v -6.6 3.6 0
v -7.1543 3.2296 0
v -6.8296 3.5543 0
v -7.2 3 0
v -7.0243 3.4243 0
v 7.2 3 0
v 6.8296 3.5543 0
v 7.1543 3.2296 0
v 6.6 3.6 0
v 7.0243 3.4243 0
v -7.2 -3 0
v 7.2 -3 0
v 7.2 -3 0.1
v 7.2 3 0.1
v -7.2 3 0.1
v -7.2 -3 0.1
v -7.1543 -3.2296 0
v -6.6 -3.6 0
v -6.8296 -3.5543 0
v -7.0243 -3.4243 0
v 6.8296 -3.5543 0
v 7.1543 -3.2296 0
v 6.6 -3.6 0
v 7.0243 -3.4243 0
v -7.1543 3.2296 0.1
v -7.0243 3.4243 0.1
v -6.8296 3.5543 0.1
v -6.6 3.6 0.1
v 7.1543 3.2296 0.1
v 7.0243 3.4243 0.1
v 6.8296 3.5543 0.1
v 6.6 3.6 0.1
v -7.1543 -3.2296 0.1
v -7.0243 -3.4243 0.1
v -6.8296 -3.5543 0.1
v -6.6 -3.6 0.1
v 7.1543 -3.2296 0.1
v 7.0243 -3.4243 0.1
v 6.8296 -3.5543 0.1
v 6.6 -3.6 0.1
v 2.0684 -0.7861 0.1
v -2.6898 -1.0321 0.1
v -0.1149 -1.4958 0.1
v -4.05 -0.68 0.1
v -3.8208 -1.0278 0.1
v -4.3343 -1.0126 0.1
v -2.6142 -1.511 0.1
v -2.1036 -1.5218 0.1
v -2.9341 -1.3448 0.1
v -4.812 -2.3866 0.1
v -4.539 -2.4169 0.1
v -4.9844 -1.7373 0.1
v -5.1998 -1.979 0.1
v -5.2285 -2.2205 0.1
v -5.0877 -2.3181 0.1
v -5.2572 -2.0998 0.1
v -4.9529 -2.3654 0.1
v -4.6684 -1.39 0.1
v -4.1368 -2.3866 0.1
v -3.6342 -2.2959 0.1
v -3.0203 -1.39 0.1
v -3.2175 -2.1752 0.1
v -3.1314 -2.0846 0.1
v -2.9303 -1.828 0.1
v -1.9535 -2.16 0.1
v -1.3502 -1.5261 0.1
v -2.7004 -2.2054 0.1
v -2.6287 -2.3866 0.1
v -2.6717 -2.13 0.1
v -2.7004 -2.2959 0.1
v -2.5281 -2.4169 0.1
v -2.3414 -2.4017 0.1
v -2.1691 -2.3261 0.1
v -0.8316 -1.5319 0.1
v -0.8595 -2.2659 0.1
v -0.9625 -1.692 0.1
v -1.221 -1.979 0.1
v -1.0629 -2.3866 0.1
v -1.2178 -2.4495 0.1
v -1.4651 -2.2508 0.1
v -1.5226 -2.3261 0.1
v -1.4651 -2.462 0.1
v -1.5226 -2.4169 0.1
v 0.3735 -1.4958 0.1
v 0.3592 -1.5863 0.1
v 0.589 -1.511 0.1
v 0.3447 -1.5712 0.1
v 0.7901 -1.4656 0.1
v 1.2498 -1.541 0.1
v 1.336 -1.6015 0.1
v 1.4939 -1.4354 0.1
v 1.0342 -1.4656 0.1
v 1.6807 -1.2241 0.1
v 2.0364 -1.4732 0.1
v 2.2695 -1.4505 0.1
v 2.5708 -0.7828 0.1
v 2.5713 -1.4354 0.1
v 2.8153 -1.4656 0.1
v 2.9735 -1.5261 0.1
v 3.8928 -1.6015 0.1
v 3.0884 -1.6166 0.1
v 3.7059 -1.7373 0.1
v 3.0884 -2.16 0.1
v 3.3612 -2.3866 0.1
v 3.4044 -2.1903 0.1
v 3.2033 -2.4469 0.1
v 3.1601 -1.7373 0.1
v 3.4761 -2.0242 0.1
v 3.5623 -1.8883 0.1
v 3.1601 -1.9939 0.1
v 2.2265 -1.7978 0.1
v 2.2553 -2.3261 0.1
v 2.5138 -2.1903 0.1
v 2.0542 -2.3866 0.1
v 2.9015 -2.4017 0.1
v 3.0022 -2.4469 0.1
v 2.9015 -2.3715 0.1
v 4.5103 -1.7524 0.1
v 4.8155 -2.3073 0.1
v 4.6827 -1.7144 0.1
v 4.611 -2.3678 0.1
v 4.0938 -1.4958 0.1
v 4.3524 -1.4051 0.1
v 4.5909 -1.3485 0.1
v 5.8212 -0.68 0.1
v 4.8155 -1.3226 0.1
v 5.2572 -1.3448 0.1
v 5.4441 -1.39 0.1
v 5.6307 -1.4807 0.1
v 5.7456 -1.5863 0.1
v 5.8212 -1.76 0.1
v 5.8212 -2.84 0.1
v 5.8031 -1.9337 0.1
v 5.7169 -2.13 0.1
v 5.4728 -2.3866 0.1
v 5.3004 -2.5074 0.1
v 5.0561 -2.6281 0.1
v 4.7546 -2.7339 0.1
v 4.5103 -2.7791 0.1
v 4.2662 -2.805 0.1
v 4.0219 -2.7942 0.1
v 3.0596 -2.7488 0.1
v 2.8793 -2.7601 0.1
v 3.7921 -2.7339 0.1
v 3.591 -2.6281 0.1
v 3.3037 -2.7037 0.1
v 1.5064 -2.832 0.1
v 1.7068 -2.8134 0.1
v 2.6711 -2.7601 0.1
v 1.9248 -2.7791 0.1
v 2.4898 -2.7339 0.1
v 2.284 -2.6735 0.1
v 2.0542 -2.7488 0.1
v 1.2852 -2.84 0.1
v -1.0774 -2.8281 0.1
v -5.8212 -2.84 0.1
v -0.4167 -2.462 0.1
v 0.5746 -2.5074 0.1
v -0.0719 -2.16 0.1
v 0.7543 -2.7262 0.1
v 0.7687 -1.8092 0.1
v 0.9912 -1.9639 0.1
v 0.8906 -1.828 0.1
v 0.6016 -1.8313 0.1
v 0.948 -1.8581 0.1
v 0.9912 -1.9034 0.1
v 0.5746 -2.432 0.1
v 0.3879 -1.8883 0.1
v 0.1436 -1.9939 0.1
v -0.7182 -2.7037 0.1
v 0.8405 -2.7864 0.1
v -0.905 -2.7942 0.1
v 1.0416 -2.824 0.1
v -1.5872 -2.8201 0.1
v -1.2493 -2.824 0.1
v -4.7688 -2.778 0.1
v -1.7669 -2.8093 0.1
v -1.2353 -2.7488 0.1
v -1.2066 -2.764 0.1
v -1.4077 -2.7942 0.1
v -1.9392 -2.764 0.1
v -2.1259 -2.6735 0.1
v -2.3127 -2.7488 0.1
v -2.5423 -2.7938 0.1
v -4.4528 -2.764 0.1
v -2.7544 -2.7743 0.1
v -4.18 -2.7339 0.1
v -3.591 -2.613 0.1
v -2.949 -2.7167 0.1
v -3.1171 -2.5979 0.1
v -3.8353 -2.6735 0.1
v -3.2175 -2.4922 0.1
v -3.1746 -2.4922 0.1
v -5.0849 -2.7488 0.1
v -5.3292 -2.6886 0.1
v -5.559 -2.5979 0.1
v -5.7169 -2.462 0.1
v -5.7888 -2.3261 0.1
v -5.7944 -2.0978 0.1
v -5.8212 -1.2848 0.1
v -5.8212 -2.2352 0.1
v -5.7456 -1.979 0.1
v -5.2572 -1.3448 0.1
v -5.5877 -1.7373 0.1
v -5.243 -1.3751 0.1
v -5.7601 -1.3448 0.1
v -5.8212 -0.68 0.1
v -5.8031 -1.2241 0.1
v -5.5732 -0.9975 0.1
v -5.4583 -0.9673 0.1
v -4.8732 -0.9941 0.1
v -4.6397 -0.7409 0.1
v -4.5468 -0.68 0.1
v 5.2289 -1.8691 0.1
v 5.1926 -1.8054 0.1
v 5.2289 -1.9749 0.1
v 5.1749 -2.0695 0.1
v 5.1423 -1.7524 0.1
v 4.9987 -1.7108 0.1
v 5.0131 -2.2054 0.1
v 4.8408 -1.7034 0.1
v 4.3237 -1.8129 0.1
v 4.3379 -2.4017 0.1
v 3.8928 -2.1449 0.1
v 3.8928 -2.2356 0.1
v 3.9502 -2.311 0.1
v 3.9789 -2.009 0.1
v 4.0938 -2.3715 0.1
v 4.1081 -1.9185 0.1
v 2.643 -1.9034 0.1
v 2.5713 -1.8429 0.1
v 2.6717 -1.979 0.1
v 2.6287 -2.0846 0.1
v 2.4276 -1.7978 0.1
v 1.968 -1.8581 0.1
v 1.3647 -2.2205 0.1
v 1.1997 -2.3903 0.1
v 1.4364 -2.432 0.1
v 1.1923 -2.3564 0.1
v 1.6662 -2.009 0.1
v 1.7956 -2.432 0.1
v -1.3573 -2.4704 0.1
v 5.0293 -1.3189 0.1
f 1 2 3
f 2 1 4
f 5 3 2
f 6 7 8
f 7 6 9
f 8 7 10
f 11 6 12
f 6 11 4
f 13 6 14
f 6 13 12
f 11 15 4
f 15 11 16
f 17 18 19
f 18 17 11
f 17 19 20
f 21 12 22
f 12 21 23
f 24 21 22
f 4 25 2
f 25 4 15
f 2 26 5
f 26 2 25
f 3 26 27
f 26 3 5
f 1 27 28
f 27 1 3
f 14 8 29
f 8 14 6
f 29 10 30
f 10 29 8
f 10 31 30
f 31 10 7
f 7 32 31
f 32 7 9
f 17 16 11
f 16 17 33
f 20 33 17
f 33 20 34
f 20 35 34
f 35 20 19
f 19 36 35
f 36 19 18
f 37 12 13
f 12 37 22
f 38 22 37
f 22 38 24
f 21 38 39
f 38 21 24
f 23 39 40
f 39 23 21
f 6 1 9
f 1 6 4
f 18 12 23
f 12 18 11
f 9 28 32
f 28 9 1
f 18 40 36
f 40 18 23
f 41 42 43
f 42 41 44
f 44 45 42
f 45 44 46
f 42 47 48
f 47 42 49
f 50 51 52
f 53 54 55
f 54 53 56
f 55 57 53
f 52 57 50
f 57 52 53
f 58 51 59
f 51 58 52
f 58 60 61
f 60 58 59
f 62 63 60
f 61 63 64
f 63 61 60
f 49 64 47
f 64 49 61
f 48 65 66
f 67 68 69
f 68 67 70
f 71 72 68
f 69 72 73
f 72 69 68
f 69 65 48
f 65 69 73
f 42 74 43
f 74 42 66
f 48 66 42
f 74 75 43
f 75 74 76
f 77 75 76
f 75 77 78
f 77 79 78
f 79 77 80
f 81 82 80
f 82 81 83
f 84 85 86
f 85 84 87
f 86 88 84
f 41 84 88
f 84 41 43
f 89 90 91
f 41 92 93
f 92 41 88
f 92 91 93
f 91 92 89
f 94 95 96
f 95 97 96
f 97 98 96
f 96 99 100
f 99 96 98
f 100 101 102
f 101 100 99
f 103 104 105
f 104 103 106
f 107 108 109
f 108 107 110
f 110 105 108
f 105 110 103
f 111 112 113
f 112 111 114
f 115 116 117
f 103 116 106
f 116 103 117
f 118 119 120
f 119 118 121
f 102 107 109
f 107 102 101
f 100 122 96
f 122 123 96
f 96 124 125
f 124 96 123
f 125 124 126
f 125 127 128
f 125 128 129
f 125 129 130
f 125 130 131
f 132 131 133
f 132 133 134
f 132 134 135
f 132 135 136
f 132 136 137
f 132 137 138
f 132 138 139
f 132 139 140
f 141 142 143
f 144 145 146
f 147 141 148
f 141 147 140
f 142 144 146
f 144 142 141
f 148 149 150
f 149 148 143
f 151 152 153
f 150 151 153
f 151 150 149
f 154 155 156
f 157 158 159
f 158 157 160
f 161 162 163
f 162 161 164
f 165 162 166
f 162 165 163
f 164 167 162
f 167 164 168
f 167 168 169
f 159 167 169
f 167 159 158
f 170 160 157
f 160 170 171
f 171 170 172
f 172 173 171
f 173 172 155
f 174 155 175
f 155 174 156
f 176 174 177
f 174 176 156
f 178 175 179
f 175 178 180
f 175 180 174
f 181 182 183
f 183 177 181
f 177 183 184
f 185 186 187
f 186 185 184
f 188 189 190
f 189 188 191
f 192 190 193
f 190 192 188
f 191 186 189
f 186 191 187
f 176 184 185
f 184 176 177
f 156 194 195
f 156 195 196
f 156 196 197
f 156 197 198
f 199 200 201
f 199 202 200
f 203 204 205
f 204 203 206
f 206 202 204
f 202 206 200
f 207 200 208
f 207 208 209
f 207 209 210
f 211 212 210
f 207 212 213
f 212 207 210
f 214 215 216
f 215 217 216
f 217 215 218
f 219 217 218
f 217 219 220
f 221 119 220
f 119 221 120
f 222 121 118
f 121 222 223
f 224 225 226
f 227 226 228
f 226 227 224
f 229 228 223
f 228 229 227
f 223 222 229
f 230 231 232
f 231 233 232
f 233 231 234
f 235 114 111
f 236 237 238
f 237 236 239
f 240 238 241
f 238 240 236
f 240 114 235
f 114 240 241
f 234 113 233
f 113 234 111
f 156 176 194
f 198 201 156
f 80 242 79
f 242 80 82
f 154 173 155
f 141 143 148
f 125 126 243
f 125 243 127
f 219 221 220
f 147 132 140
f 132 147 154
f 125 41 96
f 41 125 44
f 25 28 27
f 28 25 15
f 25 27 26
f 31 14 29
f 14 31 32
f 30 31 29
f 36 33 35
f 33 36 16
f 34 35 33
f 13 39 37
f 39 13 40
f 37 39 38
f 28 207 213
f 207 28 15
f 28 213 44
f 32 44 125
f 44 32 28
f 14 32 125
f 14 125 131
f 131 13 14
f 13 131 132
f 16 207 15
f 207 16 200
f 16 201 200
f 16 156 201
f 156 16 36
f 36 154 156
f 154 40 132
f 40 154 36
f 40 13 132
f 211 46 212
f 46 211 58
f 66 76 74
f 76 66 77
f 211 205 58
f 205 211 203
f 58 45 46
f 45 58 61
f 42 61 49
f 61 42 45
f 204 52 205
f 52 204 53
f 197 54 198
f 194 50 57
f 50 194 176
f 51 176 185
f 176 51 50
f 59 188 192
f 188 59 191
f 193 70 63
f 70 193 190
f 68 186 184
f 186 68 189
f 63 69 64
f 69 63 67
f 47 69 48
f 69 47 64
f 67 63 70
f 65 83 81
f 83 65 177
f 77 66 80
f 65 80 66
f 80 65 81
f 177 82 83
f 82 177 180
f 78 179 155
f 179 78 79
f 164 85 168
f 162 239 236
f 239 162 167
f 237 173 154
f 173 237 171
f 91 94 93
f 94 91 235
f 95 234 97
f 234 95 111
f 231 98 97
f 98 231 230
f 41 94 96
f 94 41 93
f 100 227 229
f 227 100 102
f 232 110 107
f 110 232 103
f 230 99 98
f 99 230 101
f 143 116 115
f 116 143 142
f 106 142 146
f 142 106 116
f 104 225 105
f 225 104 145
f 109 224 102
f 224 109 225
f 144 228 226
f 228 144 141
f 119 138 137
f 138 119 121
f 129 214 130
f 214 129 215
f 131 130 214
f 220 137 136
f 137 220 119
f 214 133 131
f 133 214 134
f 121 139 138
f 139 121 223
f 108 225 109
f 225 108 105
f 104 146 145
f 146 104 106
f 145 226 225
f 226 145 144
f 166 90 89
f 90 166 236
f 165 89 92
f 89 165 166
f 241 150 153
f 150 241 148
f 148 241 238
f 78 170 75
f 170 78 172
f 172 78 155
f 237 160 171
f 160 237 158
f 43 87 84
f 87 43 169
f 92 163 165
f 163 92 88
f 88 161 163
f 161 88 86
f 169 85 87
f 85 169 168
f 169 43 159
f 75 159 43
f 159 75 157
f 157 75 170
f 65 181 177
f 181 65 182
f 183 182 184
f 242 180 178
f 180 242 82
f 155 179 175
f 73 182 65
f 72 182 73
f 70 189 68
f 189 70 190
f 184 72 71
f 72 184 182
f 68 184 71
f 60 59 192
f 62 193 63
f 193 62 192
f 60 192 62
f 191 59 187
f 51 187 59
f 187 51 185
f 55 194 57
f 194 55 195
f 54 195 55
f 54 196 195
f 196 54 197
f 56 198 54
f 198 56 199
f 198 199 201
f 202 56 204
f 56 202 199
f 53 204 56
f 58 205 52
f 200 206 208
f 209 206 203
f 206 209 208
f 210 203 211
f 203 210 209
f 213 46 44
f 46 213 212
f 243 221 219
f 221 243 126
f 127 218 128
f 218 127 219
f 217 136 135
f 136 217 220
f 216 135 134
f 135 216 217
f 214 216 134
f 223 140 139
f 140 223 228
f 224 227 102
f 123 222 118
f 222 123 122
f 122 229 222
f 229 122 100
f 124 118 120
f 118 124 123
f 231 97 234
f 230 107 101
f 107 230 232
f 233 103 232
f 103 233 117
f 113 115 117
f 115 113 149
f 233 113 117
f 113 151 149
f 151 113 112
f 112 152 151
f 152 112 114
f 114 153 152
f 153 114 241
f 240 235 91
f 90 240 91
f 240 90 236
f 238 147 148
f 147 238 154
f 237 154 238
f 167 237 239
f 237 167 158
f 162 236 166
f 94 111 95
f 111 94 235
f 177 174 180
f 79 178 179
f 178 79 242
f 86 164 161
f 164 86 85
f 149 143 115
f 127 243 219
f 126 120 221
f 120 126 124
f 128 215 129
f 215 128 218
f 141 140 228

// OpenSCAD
use <../lib.scad>
use <../p/logo-porsche-turbo-text.scad>
use <s/6221655xs01.scad>
use <s/stickerback009x018.scad>
function ldraw_lib__6285381b() = [
// 0 Sticker  0.8 x  1.8 with Black "turbo" on Transparent Background
// 0 Name: 6285381b.dat
// 0 Author: Magnus Forsberg [MagFors]
// 0 !LDRAW_ORG Part UPDATE 2026-05
// 0 !LICENSE Licensed under CC BY 4.0 : see CAreadme.txt
// 
// 0 BFC CERTIFY CCW
  [0,"BFC","CERTIFY"],
  [0,"BFC","CCW"],
// 
// 0 !KEYWORDS 911, Bricklink 75895stk01, Brickowl 178456, Porsche, rear
// 0 !KEYWORDS Rebrickable 65827, set 75895
// 
// 0 !HISTORY 2022-07-18 [PTadmin] Official Update 2022-04
// 0 !HISTORY 2024-11-03 [MagFors] used logo primitives
// 0 !HISTORY 2026-04-17 [Sirio] Introduced common subpart for top face
// 0 !HISTORY 2026-05-31 [OrionP] Official Update 2026-05
// 
// 0 // Stickerback
// 1 16 0 0 0 1 0 0 0 1 0 0 0 1 s\stickerback009x018.dat
  [1,16,0,0,0,1,0,0,0,1,0,0,0,1, ldraw_lib__s__stickerback009x018()],
// 0 // Subpart
// 1 16 0 -.25 0 1 0 0 0 1 0 0 0 1 s\6221655xs01.dat
  [1,16,0,-.25,0,1,0,0,0,1,0,0,0,1, ldraw_lib__s__6221655xs01()],
// 0 BFC NOCLIP
  [0,"BFC","NOCLIP"],
// 0 // Logo primitive
// 1 0 0 -.25 -4.4 .54 0 0 0 1 0 0 0 .54 logo-porsche-turbo-text.dat
  [1,0,0,-.25,-4.4,.54,0,0,0,1,0,0,0,.54, ldraw_lib__logo_porsche_turbo_text()],
];
module ldraw_lib__6285381b(step=0, col=false, unit=2/5, alt=false, line=0.2, solid=!$preview)
    makepoly(ldraw_lib__6285381b(), step=step, col=col, unit=unit, alt=alt, line=line, solid=solid);
ldraw_lib__6285381b(line=0.2);
